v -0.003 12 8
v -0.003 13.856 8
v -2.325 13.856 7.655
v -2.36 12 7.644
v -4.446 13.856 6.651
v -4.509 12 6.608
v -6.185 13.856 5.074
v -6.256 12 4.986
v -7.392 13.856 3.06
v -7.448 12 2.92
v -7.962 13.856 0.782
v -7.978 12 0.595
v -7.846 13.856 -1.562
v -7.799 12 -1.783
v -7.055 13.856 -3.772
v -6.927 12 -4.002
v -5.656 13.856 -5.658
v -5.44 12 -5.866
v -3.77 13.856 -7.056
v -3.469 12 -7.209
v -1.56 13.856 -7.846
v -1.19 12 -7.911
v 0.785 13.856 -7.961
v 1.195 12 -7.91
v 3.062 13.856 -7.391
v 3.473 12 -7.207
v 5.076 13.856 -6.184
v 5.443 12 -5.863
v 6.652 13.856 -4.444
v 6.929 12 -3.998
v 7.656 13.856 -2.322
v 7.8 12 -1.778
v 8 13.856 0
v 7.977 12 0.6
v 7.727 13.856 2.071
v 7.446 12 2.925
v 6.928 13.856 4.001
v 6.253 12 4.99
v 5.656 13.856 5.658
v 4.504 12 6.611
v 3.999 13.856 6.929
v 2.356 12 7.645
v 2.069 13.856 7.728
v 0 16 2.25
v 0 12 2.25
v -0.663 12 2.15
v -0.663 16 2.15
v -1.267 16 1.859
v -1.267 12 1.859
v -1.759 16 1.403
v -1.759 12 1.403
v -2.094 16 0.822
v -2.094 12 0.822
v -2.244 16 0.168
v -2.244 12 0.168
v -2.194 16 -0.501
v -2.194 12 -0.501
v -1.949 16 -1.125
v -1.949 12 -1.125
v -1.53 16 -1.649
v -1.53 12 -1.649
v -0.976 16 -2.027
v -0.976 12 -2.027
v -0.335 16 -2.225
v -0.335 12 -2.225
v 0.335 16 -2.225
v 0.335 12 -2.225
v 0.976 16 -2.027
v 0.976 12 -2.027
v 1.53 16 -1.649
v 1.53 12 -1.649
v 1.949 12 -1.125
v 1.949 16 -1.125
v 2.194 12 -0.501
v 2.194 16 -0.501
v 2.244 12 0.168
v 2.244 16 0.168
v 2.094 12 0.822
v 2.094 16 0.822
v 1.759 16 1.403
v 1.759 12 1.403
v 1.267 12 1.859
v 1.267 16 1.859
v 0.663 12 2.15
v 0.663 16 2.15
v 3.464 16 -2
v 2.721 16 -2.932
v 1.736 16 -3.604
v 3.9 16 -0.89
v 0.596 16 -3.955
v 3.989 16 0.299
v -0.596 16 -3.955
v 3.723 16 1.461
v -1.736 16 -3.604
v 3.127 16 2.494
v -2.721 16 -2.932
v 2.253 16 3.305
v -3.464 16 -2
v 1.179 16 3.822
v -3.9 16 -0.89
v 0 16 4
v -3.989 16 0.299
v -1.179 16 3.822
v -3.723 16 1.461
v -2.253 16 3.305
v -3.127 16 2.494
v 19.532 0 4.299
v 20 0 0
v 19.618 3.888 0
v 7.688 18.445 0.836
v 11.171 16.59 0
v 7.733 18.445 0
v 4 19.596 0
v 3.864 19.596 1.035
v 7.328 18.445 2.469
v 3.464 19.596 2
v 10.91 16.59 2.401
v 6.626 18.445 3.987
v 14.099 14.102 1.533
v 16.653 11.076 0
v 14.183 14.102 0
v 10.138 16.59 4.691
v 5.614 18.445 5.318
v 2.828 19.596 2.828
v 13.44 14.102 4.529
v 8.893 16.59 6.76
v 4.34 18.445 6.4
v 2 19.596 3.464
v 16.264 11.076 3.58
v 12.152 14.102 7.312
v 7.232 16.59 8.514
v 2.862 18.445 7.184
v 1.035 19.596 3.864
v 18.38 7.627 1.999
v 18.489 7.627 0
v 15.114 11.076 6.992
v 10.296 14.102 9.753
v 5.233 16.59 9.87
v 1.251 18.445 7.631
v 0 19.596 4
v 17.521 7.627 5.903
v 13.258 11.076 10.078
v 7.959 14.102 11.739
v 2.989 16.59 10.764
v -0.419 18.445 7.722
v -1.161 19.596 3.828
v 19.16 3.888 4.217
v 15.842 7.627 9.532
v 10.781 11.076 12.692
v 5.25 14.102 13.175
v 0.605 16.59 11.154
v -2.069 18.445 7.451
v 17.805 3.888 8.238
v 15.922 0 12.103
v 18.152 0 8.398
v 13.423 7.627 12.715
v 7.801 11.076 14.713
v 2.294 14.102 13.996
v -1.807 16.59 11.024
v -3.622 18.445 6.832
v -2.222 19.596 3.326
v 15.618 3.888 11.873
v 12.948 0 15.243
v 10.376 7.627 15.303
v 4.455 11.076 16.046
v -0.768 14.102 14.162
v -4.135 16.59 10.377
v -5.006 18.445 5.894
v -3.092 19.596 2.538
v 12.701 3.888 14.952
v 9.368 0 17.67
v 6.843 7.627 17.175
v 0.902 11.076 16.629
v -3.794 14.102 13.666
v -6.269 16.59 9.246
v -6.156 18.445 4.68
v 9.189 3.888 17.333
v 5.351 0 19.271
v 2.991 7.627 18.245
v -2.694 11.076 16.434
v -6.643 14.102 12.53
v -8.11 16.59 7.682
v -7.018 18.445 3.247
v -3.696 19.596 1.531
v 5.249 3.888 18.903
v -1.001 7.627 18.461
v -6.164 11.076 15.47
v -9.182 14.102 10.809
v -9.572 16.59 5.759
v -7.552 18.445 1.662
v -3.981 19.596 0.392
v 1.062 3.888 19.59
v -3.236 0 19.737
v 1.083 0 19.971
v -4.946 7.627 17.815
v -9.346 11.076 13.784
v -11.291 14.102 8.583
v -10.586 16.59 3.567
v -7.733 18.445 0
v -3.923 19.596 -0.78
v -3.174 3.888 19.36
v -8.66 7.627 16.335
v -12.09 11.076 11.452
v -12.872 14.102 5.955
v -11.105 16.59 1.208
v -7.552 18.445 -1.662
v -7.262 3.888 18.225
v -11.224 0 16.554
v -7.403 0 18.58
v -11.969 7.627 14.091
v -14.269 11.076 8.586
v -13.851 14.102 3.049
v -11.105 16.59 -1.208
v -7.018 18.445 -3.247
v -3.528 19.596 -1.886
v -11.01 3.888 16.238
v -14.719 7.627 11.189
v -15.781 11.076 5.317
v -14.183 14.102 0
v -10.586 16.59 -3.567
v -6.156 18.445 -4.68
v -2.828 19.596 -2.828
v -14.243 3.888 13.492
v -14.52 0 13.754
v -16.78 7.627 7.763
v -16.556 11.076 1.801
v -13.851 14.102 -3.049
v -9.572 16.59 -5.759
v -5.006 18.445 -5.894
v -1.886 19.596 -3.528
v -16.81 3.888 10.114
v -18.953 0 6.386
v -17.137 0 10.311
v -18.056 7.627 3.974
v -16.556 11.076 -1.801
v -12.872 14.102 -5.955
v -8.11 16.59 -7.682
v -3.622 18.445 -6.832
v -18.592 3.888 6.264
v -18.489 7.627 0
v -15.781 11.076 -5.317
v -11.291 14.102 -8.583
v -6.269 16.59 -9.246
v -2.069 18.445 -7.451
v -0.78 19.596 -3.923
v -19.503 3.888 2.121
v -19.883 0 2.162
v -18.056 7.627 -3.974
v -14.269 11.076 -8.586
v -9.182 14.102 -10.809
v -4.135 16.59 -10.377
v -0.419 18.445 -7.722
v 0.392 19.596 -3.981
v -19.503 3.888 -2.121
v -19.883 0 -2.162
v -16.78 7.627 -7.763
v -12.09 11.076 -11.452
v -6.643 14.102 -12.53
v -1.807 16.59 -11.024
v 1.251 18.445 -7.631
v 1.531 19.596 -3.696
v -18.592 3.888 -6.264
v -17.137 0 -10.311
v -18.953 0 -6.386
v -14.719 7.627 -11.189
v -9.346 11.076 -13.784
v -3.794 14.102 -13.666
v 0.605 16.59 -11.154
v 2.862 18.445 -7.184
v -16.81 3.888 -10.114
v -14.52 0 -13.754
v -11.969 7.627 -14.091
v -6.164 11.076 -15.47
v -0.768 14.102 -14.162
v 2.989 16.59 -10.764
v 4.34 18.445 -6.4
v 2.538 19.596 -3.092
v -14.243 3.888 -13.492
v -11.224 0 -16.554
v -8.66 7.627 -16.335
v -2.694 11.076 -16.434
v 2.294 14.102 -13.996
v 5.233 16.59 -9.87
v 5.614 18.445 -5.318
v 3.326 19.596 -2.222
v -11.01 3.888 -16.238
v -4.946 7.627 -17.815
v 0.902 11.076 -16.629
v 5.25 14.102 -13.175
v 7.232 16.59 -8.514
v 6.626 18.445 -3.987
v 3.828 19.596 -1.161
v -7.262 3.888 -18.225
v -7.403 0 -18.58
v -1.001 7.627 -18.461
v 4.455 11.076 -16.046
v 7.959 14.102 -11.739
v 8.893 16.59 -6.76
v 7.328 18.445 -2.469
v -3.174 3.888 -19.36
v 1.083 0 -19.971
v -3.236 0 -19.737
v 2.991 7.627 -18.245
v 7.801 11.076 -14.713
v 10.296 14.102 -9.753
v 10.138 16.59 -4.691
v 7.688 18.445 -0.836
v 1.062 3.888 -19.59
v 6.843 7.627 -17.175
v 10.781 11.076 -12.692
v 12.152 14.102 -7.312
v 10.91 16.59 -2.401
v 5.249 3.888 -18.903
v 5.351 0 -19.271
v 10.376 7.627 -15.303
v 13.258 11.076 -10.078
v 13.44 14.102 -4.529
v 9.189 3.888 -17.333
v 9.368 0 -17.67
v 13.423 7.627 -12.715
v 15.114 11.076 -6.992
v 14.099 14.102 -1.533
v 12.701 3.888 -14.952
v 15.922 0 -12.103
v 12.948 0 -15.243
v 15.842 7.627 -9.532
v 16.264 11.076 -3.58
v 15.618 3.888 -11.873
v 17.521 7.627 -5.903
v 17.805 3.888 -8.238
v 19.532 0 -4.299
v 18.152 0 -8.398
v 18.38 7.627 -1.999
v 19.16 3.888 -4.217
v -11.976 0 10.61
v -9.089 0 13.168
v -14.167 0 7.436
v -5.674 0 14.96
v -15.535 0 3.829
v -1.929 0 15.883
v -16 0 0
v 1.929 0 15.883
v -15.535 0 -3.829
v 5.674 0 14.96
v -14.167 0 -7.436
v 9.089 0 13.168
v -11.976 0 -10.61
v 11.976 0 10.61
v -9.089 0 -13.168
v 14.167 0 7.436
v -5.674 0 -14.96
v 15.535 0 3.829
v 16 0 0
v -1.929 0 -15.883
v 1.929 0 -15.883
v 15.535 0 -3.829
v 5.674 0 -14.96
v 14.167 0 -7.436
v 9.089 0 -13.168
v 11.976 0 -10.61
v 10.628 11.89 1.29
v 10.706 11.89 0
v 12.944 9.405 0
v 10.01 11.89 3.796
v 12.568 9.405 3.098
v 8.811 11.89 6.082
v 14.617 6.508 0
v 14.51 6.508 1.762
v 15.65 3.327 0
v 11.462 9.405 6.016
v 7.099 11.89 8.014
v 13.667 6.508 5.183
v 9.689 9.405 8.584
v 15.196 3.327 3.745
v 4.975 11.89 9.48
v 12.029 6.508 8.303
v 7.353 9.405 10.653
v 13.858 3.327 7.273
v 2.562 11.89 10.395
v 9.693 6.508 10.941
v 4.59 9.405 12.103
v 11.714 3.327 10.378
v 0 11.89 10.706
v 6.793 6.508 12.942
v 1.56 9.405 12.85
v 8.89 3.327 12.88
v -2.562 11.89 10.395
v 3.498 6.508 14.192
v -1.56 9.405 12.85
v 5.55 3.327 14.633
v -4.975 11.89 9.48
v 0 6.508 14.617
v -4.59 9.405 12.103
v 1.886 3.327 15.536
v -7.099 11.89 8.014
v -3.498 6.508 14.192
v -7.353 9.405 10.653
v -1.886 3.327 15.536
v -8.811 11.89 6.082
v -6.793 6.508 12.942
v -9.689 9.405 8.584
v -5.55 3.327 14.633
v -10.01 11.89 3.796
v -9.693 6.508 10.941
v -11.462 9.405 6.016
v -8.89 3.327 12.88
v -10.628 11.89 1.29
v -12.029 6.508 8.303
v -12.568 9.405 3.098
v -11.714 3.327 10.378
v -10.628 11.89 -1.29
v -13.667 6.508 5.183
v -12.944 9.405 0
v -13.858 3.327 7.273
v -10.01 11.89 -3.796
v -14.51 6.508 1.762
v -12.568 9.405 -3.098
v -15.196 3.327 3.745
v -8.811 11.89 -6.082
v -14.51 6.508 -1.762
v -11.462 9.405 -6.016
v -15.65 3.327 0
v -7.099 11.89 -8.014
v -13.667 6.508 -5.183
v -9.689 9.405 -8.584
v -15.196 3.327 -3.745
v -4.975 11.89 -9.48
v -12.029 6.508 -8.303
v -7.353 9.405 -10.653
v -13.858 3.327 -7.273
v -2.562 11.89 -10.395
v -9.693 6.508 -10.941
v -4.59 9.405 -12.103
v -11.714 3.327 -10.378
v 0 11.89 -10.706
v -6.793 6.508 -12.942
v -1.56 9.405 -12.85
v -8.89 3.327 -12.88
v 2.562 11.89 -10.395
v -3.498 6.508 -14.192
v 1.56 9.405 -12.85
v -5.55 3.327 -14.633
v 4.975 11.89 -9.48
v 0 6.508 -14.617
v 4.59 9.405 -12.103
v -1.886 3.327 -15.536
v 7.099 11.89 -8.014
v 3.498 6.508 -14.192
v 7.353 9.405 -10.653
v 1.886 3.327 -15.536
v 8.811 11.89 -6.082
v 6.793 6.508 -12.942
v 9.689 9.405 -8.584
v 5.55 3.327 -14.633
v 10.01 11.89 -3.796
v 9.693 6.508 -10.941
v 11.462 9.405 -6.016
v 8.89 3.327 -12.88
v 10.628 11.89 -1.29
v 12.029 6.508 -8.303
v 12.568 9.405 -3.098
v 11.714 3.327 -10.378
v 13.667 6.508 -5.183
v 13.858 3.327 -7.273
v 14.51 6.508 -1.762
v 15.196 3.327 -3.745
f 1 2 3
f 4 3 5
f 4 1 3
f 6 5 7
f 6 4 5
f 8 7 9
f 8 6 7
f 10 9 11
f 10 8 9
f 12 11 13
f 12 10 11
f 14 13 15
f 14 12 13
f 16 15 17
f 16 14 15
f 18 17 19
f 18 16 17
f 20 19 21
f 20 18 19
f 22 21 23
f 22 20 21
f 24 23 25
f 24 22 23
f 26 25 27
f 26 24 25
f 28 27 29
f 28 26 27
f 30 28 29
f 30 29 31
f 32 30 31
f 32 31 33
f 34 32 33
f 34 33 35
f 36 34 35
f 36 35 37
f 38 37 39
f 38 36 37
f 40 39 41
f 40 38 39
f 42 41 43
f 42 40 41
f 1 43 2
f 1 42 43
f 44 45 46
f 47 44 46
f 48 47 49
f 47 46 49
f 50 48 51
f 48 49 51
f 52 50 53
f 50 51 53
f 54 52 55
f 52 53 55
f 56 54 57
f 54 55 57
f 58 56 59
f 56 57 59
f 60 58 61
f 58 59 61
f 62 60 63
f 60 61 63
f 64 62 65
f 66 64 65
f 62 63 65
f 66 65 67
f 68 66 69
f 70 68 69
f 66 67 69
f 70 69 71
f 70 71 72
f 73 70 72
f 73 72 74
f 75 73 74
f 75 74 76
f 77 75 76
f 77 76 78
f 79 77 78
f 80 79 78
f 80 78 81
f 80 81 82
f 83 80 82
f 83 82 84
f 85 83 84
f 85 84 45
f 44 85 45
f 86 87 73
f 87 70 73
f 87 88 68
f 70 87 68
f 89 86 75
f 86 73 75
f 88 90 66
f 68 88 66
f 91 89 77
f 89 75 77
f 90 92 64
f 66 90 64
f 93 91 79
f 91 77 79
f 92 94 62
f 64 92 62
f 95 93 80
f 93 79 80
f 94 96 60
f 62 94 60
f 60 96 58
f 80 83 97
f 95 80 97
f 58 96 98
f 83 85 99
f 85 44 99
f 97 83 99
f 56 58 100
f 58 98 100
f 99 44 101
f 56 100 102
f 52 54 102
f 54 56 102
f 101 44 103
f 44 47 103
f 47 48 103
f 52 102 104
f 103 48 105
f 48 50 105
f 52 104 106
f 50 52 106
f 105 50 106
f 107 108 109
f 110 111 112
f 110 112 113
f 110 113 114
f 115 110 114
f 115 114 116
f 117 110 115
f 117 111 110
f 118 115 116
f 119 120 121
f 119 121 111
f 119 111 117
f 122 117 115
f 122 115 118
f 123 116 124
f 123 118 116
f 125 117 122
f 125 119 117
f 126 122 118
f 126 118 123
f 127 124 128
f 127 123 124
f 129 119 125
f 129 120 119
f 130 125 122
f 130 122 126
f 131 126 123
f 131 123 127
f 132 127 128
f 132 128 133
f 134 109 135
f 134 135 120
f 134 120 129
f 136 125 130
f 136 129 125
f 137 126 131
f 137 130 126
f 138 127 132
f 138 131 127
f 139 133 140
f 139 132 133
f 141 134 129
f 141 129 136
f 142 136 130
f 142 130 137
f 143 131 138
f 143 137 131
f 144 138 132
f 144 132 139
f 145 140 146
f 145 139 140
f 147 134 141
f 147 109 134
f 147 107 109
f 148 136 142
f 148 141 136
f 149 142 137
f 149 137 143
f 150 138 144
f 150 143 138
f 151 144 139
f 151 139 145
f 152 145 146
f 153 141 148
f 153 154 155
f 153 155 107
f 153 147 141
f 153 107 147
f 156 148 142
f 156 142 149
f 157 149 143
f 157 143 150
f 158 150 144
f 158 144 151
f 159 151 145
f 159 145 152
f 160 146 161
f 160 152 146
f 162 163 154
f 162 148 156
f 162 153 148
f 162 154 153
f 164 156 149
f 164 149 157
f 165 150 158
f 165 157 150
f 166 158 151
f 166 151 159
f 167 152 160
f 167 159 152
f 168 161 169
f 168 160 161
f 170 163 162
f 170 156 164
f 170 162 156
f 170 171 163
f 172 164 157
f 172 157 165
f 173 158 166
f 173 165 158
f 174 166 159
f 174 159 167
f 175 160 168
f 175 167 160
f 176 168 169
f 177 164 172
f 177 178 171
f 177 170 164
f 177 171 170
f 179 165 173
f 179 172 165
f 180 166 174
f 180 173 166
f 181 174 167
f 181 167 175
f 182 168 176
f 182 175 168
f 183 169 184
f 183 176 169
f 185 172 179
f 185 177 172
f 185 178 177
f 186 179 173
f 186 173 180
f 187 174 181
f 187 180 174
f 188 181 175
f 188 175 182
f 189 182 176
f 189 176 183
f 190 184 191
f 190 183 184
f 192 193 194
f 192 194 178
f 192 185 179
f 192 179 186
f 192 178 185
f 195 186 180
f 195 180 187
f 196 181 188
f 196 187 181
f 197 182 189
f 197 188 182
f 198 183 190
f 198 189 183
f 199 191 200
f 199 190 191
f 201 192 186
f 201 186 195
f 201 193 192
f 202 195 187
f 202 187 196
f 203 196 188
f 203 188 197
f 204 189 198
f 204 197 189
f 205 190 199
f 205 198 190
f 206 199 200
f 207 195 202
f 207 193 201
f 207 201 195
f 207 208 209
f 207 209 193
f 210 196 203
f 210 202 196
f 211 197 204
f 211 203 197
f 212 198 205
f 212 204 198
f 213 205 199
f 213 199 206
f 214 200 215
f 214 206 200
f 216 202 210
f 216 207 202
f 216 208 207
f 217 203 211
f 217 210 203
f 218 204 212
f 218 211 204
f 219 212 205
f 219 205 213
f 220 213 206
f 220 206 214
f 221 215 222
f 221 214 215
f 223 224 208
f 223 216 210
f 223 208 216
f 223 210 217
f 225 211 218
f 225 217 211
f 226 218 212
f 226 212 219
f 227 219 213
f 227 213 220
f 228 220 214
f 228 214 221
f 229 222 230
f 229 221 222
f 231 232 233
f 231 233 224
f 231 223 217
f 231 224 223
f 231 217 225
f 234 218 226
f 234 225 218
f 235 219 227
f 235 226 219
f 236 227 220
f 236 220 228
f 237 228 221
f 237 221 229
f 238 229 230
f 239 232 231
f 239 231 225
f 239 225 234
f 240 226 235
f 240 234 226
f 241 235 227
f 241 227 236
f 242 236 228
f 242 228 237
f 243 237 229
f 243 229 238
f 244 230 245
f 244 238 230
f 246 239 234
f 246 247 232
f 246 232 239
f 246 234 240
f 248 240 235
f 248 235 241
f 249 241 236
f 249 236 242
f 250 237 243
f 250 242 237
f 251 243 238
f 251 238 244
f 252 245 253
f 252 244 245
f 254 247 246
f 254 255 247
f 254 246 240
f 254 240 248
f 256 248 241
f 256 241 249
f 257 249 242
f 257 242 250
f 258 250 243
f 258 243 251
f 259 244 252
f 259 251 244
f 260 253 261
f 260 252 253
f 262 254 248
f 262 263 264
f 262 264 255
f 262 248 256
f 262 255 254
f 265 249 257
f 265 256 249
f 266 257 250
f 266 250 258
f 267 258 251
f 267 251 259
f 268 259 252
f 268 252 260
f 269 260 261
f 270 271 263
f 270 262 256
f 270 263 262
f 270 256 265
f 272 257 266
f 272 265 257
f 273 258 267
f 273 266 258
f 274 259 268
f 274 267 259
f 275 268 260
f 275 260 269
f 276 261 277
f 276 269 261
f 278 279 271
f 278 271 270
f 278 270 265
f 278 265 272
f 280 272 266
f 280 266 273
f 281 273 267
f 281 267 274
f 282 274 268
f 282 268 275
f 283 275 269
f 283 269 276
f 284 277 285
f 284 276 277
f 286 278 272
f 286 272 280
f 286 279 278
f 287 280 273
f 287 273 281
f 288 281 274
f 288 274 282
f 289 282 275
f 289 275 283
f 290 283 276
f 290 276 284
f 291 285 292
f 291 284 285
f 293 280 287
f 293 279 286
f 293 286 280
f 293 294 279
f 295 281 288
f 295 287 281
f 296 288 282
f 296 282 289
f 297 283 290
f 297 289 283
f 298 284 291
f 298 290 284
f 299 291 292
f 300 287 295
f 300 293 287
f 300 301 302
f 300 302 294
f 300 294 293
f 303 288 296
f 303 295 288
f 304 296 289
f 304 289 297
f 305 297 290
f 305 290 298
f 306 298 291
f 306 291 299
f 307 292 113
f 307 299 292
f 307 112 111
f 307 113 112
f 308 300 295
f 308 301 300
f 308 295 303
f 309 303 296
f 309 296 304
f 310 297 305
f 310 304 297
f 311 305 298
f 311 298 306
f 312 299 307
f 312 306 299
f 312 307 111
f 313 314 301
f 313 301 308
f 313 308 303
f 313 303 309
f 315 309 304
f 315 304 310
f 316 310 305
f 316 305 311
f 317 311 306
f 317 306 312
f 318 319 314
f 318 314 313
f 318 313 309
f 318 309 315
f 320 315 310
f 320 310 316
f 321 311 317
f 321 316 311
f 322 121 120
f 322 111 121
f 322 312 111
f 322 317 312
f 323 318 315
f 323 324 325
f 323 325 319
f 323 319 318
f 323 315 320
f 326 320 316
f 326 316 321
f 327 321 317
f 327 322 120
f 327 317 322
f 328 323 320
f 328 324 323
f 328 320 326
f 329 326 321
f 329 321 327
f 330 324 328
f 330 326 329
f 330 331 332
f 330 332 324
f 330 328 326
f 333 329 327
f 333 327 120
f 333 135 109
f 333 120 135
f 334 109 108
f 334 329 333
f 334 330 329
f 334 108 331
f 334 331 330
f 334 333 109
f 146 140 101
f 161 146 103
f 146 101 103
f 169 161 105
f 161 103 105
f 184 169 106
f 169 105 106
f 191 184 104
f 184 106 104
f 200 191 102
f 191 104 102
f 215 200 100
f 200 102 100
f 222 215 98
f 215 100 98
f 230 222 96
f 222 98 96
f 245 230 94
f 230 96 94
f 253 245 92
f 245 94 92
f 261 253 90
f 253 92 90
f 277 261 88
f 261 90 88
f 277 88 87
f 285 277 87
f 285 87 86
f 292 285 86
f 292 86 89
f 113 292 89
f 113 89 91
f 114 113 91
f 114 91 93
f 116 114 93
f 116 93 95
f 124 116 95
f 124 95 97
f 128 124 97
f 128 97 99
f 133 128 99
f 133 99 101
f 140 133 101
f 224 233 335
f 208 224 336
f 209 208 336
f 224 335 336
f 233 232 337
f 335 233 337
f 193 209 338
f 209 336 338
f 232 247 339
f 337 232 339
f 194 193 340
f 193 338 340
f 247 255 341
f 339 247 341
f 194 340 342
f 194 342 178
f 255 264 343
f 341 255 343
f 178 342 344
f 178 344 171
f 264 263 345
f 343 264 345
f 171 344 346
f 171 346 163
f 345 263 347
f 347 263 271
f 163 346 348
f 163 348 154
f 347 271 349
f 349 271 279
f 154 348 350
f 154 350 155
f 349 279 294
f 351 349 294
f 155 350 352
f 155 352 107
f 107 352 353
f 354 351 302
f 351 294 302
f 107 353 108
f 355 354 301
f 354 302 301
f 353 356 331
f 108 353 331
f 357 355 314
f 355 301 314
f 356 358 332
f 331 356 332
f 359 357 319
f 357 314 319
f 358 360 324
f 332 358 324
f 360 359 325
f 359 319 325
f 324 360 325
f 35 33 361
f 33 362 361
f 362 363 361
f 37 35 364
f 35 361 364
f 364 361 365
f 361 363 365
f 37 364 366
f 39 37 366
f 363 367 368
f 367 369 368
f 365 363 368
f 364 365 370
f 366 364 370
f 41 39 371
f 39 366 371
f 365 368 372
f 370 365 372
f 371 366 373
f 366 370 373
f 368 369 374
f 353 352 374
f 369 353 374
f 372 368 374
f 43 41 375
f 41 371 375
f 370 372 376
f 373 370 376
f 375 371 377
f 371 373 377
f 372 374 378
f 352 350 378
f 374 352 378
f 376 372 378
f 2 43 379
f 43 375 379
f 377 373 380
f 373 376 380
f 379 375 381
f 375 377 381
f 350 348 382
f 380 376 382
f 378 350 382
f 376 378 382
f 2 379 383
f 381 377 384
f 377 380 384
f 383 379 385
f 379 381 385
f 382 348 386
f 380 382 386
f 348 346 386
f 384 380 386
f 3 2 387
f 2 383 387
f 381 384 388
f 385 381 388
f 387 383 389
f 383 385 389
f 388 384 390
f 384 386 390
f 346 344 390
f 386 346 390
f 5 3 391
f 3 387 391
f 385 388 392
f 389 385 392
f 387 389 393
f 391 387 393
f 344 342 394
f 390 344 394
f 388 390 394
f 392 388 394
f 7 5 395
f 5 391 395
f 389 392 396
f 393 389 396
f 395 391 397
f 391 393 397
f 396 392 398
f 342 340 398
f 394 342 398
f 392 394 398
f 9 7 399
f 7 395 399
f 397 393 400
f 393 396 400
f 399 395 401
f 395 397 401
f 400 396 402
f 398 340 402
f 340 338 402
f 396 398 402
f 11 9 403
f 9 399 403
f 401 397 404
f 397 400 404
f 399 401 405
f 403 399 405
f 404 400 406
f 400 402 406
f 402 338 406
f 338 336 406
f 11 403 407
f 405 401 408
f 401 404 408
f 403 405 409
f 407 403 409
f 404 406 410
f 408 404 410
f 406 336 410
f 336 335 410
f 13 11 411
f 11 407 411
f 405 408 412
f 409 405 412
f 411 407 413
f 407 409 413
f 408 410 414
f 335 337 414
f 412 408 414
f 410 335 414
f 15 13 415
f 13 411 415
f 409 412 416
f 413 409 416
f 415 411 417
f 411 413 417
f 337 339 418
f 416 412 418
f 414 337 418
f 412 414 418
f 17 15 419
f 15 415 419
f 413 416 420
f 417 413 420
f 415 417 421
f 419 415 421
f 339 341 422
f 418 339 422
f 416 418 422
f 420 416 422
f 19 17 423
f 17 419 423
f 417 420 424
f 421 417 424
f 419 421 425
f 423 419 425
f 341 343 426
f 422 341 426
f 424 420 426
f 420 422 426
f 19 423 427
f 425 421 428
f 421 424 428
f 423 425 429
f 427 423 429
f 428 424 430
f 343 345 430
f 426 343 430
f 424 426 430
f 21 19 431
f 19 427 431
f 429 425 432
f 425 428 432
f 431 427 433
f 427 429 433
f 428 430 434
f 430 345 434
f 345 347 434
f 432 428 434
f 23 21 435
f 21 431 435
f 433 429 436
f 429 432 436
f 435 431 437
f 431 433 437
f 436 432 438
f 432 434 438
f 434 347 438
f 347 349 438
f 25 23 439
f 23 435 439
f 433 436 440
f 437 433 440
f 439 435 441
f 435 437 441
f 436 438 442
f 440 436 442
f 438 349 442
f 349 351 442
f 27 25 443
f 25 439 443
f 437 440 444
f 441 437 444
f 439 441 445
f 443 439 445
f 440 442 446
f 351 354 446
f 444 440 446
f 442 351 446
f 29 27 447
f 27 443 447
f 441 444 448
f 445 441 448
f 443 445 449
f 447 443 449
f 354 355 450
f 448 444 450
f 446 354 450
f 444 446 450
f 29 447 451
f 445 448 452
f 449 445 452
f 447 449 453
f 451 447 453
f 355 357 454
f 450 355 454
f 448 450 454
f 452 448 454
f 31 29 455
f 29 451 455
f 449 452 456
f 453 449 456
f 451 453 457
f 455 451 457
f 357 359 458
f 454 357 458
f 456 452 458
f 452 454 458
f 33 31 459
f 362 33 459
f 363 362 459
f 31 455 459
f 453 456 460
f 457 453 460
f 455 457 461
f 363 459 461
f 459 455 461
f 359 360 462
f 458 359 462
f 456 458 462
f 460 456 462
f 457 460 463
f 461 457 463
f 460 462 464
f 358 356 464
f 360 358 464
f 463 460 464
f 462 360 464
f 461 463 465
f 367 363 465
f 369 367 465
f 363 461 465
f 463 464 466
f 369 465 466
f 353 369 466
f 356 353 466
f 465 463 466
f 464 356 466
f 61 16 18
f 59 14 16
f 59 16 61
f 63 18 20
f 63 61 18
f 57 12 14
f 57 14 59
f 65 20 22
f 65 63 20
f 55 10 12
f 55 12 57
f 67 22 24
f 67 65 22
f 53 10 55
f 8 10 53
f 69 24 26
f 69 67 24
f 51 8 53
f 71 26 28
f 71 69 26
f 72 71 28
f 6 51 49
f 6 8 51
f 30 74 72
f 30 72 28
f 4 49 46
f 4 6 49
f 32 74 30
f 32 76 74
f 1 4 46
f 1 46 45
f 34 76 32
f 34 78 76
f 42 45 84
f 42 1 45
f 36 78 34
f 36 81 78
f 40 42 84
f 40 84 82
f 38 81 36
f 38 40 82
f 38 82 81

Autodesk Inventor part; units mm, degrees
ref_plane "YZ Plane" through (0, 0, 0) normal (1, 0, 0) x (0, 1, 0)
ref_plane "XY Plane" through (0, 0, 0) normal (0, 0, 1) x (1, 0, 0)
sketch "Sketch1" plane through (0, 0, 0) normal (0, 0, 1) x (1, 0, 0)
  line L0 (0, 0) -> (0, 20)
  line L1 (0, 0) -> (20, 0)
  arc A0 (20, 0) -> (0, 20) centre (0, 0) ccw
  line L2 (0, -4.828427) -> (0, 28.970563)
  dimension "d2" = 20
sketch "Sketch1 outline for Revolution1" plane through (0, 0, 0) normal (0, 0, 1) x (1, 0, 0)
  line L0 (0, 0) -> (0, 20)
  arc A0 (0, 20) -> (20, 0) centre (0, 0) cw
  line L1 (20, 0) -> (0, 0)
revolve "Revolution1" add sketch "Sketch1 outline for Revolution1" angle 360 about axis through (0, -10, 0) along (0, 1, 0)
ref_plane "Work Plane1" through (0, 20, 0) normal (0, 1, 0) x (-1, 0, 0)
sketch "Sketch2" plane through (0, 20, 0) normal (0, 1, 0) x (-1, 0, 0)
  point P0 (0, 0)
  point P1 (0, 0)
hole "Hole1" at (0, 20, 0) direction (0, -1, 0) diameter 4.5 end through all counterbore diameter 8 counterbore depth 4 clearance for "Socket Head Cap Screw" size "M4" standard "Ansi Metric M Profile"
shell "Shell1" thickness 4 removed faces 1 at (13.884144, 0, 1.68584)
sketch "Sketch3" plane through (0, 0, 0) normal (0, -1, 0) x (1, 0, 0)
  circle A0 centre (0, 0) radius 2.25 projected
  circle A1 centre (0, 0) radius 6.25 projected
  circle A2 centre (0, 0) radius 2.25 projected
sketch "Sketch3 outline for Extrusion1" plane through (0, 0, 0) normal (0, -1, 0) x (1, 0, 0)
  circle A0 centre (0, 0) radius 6.25
  circle A1 centre (0, 0) radius 2.25
extrude "Extrusion1" cut sketch "Sketch3 outline for Extrusion1" against normal up to surface (12 mm away)
properties part number "Ball_Upper Half" material "Nylon 6/6"
